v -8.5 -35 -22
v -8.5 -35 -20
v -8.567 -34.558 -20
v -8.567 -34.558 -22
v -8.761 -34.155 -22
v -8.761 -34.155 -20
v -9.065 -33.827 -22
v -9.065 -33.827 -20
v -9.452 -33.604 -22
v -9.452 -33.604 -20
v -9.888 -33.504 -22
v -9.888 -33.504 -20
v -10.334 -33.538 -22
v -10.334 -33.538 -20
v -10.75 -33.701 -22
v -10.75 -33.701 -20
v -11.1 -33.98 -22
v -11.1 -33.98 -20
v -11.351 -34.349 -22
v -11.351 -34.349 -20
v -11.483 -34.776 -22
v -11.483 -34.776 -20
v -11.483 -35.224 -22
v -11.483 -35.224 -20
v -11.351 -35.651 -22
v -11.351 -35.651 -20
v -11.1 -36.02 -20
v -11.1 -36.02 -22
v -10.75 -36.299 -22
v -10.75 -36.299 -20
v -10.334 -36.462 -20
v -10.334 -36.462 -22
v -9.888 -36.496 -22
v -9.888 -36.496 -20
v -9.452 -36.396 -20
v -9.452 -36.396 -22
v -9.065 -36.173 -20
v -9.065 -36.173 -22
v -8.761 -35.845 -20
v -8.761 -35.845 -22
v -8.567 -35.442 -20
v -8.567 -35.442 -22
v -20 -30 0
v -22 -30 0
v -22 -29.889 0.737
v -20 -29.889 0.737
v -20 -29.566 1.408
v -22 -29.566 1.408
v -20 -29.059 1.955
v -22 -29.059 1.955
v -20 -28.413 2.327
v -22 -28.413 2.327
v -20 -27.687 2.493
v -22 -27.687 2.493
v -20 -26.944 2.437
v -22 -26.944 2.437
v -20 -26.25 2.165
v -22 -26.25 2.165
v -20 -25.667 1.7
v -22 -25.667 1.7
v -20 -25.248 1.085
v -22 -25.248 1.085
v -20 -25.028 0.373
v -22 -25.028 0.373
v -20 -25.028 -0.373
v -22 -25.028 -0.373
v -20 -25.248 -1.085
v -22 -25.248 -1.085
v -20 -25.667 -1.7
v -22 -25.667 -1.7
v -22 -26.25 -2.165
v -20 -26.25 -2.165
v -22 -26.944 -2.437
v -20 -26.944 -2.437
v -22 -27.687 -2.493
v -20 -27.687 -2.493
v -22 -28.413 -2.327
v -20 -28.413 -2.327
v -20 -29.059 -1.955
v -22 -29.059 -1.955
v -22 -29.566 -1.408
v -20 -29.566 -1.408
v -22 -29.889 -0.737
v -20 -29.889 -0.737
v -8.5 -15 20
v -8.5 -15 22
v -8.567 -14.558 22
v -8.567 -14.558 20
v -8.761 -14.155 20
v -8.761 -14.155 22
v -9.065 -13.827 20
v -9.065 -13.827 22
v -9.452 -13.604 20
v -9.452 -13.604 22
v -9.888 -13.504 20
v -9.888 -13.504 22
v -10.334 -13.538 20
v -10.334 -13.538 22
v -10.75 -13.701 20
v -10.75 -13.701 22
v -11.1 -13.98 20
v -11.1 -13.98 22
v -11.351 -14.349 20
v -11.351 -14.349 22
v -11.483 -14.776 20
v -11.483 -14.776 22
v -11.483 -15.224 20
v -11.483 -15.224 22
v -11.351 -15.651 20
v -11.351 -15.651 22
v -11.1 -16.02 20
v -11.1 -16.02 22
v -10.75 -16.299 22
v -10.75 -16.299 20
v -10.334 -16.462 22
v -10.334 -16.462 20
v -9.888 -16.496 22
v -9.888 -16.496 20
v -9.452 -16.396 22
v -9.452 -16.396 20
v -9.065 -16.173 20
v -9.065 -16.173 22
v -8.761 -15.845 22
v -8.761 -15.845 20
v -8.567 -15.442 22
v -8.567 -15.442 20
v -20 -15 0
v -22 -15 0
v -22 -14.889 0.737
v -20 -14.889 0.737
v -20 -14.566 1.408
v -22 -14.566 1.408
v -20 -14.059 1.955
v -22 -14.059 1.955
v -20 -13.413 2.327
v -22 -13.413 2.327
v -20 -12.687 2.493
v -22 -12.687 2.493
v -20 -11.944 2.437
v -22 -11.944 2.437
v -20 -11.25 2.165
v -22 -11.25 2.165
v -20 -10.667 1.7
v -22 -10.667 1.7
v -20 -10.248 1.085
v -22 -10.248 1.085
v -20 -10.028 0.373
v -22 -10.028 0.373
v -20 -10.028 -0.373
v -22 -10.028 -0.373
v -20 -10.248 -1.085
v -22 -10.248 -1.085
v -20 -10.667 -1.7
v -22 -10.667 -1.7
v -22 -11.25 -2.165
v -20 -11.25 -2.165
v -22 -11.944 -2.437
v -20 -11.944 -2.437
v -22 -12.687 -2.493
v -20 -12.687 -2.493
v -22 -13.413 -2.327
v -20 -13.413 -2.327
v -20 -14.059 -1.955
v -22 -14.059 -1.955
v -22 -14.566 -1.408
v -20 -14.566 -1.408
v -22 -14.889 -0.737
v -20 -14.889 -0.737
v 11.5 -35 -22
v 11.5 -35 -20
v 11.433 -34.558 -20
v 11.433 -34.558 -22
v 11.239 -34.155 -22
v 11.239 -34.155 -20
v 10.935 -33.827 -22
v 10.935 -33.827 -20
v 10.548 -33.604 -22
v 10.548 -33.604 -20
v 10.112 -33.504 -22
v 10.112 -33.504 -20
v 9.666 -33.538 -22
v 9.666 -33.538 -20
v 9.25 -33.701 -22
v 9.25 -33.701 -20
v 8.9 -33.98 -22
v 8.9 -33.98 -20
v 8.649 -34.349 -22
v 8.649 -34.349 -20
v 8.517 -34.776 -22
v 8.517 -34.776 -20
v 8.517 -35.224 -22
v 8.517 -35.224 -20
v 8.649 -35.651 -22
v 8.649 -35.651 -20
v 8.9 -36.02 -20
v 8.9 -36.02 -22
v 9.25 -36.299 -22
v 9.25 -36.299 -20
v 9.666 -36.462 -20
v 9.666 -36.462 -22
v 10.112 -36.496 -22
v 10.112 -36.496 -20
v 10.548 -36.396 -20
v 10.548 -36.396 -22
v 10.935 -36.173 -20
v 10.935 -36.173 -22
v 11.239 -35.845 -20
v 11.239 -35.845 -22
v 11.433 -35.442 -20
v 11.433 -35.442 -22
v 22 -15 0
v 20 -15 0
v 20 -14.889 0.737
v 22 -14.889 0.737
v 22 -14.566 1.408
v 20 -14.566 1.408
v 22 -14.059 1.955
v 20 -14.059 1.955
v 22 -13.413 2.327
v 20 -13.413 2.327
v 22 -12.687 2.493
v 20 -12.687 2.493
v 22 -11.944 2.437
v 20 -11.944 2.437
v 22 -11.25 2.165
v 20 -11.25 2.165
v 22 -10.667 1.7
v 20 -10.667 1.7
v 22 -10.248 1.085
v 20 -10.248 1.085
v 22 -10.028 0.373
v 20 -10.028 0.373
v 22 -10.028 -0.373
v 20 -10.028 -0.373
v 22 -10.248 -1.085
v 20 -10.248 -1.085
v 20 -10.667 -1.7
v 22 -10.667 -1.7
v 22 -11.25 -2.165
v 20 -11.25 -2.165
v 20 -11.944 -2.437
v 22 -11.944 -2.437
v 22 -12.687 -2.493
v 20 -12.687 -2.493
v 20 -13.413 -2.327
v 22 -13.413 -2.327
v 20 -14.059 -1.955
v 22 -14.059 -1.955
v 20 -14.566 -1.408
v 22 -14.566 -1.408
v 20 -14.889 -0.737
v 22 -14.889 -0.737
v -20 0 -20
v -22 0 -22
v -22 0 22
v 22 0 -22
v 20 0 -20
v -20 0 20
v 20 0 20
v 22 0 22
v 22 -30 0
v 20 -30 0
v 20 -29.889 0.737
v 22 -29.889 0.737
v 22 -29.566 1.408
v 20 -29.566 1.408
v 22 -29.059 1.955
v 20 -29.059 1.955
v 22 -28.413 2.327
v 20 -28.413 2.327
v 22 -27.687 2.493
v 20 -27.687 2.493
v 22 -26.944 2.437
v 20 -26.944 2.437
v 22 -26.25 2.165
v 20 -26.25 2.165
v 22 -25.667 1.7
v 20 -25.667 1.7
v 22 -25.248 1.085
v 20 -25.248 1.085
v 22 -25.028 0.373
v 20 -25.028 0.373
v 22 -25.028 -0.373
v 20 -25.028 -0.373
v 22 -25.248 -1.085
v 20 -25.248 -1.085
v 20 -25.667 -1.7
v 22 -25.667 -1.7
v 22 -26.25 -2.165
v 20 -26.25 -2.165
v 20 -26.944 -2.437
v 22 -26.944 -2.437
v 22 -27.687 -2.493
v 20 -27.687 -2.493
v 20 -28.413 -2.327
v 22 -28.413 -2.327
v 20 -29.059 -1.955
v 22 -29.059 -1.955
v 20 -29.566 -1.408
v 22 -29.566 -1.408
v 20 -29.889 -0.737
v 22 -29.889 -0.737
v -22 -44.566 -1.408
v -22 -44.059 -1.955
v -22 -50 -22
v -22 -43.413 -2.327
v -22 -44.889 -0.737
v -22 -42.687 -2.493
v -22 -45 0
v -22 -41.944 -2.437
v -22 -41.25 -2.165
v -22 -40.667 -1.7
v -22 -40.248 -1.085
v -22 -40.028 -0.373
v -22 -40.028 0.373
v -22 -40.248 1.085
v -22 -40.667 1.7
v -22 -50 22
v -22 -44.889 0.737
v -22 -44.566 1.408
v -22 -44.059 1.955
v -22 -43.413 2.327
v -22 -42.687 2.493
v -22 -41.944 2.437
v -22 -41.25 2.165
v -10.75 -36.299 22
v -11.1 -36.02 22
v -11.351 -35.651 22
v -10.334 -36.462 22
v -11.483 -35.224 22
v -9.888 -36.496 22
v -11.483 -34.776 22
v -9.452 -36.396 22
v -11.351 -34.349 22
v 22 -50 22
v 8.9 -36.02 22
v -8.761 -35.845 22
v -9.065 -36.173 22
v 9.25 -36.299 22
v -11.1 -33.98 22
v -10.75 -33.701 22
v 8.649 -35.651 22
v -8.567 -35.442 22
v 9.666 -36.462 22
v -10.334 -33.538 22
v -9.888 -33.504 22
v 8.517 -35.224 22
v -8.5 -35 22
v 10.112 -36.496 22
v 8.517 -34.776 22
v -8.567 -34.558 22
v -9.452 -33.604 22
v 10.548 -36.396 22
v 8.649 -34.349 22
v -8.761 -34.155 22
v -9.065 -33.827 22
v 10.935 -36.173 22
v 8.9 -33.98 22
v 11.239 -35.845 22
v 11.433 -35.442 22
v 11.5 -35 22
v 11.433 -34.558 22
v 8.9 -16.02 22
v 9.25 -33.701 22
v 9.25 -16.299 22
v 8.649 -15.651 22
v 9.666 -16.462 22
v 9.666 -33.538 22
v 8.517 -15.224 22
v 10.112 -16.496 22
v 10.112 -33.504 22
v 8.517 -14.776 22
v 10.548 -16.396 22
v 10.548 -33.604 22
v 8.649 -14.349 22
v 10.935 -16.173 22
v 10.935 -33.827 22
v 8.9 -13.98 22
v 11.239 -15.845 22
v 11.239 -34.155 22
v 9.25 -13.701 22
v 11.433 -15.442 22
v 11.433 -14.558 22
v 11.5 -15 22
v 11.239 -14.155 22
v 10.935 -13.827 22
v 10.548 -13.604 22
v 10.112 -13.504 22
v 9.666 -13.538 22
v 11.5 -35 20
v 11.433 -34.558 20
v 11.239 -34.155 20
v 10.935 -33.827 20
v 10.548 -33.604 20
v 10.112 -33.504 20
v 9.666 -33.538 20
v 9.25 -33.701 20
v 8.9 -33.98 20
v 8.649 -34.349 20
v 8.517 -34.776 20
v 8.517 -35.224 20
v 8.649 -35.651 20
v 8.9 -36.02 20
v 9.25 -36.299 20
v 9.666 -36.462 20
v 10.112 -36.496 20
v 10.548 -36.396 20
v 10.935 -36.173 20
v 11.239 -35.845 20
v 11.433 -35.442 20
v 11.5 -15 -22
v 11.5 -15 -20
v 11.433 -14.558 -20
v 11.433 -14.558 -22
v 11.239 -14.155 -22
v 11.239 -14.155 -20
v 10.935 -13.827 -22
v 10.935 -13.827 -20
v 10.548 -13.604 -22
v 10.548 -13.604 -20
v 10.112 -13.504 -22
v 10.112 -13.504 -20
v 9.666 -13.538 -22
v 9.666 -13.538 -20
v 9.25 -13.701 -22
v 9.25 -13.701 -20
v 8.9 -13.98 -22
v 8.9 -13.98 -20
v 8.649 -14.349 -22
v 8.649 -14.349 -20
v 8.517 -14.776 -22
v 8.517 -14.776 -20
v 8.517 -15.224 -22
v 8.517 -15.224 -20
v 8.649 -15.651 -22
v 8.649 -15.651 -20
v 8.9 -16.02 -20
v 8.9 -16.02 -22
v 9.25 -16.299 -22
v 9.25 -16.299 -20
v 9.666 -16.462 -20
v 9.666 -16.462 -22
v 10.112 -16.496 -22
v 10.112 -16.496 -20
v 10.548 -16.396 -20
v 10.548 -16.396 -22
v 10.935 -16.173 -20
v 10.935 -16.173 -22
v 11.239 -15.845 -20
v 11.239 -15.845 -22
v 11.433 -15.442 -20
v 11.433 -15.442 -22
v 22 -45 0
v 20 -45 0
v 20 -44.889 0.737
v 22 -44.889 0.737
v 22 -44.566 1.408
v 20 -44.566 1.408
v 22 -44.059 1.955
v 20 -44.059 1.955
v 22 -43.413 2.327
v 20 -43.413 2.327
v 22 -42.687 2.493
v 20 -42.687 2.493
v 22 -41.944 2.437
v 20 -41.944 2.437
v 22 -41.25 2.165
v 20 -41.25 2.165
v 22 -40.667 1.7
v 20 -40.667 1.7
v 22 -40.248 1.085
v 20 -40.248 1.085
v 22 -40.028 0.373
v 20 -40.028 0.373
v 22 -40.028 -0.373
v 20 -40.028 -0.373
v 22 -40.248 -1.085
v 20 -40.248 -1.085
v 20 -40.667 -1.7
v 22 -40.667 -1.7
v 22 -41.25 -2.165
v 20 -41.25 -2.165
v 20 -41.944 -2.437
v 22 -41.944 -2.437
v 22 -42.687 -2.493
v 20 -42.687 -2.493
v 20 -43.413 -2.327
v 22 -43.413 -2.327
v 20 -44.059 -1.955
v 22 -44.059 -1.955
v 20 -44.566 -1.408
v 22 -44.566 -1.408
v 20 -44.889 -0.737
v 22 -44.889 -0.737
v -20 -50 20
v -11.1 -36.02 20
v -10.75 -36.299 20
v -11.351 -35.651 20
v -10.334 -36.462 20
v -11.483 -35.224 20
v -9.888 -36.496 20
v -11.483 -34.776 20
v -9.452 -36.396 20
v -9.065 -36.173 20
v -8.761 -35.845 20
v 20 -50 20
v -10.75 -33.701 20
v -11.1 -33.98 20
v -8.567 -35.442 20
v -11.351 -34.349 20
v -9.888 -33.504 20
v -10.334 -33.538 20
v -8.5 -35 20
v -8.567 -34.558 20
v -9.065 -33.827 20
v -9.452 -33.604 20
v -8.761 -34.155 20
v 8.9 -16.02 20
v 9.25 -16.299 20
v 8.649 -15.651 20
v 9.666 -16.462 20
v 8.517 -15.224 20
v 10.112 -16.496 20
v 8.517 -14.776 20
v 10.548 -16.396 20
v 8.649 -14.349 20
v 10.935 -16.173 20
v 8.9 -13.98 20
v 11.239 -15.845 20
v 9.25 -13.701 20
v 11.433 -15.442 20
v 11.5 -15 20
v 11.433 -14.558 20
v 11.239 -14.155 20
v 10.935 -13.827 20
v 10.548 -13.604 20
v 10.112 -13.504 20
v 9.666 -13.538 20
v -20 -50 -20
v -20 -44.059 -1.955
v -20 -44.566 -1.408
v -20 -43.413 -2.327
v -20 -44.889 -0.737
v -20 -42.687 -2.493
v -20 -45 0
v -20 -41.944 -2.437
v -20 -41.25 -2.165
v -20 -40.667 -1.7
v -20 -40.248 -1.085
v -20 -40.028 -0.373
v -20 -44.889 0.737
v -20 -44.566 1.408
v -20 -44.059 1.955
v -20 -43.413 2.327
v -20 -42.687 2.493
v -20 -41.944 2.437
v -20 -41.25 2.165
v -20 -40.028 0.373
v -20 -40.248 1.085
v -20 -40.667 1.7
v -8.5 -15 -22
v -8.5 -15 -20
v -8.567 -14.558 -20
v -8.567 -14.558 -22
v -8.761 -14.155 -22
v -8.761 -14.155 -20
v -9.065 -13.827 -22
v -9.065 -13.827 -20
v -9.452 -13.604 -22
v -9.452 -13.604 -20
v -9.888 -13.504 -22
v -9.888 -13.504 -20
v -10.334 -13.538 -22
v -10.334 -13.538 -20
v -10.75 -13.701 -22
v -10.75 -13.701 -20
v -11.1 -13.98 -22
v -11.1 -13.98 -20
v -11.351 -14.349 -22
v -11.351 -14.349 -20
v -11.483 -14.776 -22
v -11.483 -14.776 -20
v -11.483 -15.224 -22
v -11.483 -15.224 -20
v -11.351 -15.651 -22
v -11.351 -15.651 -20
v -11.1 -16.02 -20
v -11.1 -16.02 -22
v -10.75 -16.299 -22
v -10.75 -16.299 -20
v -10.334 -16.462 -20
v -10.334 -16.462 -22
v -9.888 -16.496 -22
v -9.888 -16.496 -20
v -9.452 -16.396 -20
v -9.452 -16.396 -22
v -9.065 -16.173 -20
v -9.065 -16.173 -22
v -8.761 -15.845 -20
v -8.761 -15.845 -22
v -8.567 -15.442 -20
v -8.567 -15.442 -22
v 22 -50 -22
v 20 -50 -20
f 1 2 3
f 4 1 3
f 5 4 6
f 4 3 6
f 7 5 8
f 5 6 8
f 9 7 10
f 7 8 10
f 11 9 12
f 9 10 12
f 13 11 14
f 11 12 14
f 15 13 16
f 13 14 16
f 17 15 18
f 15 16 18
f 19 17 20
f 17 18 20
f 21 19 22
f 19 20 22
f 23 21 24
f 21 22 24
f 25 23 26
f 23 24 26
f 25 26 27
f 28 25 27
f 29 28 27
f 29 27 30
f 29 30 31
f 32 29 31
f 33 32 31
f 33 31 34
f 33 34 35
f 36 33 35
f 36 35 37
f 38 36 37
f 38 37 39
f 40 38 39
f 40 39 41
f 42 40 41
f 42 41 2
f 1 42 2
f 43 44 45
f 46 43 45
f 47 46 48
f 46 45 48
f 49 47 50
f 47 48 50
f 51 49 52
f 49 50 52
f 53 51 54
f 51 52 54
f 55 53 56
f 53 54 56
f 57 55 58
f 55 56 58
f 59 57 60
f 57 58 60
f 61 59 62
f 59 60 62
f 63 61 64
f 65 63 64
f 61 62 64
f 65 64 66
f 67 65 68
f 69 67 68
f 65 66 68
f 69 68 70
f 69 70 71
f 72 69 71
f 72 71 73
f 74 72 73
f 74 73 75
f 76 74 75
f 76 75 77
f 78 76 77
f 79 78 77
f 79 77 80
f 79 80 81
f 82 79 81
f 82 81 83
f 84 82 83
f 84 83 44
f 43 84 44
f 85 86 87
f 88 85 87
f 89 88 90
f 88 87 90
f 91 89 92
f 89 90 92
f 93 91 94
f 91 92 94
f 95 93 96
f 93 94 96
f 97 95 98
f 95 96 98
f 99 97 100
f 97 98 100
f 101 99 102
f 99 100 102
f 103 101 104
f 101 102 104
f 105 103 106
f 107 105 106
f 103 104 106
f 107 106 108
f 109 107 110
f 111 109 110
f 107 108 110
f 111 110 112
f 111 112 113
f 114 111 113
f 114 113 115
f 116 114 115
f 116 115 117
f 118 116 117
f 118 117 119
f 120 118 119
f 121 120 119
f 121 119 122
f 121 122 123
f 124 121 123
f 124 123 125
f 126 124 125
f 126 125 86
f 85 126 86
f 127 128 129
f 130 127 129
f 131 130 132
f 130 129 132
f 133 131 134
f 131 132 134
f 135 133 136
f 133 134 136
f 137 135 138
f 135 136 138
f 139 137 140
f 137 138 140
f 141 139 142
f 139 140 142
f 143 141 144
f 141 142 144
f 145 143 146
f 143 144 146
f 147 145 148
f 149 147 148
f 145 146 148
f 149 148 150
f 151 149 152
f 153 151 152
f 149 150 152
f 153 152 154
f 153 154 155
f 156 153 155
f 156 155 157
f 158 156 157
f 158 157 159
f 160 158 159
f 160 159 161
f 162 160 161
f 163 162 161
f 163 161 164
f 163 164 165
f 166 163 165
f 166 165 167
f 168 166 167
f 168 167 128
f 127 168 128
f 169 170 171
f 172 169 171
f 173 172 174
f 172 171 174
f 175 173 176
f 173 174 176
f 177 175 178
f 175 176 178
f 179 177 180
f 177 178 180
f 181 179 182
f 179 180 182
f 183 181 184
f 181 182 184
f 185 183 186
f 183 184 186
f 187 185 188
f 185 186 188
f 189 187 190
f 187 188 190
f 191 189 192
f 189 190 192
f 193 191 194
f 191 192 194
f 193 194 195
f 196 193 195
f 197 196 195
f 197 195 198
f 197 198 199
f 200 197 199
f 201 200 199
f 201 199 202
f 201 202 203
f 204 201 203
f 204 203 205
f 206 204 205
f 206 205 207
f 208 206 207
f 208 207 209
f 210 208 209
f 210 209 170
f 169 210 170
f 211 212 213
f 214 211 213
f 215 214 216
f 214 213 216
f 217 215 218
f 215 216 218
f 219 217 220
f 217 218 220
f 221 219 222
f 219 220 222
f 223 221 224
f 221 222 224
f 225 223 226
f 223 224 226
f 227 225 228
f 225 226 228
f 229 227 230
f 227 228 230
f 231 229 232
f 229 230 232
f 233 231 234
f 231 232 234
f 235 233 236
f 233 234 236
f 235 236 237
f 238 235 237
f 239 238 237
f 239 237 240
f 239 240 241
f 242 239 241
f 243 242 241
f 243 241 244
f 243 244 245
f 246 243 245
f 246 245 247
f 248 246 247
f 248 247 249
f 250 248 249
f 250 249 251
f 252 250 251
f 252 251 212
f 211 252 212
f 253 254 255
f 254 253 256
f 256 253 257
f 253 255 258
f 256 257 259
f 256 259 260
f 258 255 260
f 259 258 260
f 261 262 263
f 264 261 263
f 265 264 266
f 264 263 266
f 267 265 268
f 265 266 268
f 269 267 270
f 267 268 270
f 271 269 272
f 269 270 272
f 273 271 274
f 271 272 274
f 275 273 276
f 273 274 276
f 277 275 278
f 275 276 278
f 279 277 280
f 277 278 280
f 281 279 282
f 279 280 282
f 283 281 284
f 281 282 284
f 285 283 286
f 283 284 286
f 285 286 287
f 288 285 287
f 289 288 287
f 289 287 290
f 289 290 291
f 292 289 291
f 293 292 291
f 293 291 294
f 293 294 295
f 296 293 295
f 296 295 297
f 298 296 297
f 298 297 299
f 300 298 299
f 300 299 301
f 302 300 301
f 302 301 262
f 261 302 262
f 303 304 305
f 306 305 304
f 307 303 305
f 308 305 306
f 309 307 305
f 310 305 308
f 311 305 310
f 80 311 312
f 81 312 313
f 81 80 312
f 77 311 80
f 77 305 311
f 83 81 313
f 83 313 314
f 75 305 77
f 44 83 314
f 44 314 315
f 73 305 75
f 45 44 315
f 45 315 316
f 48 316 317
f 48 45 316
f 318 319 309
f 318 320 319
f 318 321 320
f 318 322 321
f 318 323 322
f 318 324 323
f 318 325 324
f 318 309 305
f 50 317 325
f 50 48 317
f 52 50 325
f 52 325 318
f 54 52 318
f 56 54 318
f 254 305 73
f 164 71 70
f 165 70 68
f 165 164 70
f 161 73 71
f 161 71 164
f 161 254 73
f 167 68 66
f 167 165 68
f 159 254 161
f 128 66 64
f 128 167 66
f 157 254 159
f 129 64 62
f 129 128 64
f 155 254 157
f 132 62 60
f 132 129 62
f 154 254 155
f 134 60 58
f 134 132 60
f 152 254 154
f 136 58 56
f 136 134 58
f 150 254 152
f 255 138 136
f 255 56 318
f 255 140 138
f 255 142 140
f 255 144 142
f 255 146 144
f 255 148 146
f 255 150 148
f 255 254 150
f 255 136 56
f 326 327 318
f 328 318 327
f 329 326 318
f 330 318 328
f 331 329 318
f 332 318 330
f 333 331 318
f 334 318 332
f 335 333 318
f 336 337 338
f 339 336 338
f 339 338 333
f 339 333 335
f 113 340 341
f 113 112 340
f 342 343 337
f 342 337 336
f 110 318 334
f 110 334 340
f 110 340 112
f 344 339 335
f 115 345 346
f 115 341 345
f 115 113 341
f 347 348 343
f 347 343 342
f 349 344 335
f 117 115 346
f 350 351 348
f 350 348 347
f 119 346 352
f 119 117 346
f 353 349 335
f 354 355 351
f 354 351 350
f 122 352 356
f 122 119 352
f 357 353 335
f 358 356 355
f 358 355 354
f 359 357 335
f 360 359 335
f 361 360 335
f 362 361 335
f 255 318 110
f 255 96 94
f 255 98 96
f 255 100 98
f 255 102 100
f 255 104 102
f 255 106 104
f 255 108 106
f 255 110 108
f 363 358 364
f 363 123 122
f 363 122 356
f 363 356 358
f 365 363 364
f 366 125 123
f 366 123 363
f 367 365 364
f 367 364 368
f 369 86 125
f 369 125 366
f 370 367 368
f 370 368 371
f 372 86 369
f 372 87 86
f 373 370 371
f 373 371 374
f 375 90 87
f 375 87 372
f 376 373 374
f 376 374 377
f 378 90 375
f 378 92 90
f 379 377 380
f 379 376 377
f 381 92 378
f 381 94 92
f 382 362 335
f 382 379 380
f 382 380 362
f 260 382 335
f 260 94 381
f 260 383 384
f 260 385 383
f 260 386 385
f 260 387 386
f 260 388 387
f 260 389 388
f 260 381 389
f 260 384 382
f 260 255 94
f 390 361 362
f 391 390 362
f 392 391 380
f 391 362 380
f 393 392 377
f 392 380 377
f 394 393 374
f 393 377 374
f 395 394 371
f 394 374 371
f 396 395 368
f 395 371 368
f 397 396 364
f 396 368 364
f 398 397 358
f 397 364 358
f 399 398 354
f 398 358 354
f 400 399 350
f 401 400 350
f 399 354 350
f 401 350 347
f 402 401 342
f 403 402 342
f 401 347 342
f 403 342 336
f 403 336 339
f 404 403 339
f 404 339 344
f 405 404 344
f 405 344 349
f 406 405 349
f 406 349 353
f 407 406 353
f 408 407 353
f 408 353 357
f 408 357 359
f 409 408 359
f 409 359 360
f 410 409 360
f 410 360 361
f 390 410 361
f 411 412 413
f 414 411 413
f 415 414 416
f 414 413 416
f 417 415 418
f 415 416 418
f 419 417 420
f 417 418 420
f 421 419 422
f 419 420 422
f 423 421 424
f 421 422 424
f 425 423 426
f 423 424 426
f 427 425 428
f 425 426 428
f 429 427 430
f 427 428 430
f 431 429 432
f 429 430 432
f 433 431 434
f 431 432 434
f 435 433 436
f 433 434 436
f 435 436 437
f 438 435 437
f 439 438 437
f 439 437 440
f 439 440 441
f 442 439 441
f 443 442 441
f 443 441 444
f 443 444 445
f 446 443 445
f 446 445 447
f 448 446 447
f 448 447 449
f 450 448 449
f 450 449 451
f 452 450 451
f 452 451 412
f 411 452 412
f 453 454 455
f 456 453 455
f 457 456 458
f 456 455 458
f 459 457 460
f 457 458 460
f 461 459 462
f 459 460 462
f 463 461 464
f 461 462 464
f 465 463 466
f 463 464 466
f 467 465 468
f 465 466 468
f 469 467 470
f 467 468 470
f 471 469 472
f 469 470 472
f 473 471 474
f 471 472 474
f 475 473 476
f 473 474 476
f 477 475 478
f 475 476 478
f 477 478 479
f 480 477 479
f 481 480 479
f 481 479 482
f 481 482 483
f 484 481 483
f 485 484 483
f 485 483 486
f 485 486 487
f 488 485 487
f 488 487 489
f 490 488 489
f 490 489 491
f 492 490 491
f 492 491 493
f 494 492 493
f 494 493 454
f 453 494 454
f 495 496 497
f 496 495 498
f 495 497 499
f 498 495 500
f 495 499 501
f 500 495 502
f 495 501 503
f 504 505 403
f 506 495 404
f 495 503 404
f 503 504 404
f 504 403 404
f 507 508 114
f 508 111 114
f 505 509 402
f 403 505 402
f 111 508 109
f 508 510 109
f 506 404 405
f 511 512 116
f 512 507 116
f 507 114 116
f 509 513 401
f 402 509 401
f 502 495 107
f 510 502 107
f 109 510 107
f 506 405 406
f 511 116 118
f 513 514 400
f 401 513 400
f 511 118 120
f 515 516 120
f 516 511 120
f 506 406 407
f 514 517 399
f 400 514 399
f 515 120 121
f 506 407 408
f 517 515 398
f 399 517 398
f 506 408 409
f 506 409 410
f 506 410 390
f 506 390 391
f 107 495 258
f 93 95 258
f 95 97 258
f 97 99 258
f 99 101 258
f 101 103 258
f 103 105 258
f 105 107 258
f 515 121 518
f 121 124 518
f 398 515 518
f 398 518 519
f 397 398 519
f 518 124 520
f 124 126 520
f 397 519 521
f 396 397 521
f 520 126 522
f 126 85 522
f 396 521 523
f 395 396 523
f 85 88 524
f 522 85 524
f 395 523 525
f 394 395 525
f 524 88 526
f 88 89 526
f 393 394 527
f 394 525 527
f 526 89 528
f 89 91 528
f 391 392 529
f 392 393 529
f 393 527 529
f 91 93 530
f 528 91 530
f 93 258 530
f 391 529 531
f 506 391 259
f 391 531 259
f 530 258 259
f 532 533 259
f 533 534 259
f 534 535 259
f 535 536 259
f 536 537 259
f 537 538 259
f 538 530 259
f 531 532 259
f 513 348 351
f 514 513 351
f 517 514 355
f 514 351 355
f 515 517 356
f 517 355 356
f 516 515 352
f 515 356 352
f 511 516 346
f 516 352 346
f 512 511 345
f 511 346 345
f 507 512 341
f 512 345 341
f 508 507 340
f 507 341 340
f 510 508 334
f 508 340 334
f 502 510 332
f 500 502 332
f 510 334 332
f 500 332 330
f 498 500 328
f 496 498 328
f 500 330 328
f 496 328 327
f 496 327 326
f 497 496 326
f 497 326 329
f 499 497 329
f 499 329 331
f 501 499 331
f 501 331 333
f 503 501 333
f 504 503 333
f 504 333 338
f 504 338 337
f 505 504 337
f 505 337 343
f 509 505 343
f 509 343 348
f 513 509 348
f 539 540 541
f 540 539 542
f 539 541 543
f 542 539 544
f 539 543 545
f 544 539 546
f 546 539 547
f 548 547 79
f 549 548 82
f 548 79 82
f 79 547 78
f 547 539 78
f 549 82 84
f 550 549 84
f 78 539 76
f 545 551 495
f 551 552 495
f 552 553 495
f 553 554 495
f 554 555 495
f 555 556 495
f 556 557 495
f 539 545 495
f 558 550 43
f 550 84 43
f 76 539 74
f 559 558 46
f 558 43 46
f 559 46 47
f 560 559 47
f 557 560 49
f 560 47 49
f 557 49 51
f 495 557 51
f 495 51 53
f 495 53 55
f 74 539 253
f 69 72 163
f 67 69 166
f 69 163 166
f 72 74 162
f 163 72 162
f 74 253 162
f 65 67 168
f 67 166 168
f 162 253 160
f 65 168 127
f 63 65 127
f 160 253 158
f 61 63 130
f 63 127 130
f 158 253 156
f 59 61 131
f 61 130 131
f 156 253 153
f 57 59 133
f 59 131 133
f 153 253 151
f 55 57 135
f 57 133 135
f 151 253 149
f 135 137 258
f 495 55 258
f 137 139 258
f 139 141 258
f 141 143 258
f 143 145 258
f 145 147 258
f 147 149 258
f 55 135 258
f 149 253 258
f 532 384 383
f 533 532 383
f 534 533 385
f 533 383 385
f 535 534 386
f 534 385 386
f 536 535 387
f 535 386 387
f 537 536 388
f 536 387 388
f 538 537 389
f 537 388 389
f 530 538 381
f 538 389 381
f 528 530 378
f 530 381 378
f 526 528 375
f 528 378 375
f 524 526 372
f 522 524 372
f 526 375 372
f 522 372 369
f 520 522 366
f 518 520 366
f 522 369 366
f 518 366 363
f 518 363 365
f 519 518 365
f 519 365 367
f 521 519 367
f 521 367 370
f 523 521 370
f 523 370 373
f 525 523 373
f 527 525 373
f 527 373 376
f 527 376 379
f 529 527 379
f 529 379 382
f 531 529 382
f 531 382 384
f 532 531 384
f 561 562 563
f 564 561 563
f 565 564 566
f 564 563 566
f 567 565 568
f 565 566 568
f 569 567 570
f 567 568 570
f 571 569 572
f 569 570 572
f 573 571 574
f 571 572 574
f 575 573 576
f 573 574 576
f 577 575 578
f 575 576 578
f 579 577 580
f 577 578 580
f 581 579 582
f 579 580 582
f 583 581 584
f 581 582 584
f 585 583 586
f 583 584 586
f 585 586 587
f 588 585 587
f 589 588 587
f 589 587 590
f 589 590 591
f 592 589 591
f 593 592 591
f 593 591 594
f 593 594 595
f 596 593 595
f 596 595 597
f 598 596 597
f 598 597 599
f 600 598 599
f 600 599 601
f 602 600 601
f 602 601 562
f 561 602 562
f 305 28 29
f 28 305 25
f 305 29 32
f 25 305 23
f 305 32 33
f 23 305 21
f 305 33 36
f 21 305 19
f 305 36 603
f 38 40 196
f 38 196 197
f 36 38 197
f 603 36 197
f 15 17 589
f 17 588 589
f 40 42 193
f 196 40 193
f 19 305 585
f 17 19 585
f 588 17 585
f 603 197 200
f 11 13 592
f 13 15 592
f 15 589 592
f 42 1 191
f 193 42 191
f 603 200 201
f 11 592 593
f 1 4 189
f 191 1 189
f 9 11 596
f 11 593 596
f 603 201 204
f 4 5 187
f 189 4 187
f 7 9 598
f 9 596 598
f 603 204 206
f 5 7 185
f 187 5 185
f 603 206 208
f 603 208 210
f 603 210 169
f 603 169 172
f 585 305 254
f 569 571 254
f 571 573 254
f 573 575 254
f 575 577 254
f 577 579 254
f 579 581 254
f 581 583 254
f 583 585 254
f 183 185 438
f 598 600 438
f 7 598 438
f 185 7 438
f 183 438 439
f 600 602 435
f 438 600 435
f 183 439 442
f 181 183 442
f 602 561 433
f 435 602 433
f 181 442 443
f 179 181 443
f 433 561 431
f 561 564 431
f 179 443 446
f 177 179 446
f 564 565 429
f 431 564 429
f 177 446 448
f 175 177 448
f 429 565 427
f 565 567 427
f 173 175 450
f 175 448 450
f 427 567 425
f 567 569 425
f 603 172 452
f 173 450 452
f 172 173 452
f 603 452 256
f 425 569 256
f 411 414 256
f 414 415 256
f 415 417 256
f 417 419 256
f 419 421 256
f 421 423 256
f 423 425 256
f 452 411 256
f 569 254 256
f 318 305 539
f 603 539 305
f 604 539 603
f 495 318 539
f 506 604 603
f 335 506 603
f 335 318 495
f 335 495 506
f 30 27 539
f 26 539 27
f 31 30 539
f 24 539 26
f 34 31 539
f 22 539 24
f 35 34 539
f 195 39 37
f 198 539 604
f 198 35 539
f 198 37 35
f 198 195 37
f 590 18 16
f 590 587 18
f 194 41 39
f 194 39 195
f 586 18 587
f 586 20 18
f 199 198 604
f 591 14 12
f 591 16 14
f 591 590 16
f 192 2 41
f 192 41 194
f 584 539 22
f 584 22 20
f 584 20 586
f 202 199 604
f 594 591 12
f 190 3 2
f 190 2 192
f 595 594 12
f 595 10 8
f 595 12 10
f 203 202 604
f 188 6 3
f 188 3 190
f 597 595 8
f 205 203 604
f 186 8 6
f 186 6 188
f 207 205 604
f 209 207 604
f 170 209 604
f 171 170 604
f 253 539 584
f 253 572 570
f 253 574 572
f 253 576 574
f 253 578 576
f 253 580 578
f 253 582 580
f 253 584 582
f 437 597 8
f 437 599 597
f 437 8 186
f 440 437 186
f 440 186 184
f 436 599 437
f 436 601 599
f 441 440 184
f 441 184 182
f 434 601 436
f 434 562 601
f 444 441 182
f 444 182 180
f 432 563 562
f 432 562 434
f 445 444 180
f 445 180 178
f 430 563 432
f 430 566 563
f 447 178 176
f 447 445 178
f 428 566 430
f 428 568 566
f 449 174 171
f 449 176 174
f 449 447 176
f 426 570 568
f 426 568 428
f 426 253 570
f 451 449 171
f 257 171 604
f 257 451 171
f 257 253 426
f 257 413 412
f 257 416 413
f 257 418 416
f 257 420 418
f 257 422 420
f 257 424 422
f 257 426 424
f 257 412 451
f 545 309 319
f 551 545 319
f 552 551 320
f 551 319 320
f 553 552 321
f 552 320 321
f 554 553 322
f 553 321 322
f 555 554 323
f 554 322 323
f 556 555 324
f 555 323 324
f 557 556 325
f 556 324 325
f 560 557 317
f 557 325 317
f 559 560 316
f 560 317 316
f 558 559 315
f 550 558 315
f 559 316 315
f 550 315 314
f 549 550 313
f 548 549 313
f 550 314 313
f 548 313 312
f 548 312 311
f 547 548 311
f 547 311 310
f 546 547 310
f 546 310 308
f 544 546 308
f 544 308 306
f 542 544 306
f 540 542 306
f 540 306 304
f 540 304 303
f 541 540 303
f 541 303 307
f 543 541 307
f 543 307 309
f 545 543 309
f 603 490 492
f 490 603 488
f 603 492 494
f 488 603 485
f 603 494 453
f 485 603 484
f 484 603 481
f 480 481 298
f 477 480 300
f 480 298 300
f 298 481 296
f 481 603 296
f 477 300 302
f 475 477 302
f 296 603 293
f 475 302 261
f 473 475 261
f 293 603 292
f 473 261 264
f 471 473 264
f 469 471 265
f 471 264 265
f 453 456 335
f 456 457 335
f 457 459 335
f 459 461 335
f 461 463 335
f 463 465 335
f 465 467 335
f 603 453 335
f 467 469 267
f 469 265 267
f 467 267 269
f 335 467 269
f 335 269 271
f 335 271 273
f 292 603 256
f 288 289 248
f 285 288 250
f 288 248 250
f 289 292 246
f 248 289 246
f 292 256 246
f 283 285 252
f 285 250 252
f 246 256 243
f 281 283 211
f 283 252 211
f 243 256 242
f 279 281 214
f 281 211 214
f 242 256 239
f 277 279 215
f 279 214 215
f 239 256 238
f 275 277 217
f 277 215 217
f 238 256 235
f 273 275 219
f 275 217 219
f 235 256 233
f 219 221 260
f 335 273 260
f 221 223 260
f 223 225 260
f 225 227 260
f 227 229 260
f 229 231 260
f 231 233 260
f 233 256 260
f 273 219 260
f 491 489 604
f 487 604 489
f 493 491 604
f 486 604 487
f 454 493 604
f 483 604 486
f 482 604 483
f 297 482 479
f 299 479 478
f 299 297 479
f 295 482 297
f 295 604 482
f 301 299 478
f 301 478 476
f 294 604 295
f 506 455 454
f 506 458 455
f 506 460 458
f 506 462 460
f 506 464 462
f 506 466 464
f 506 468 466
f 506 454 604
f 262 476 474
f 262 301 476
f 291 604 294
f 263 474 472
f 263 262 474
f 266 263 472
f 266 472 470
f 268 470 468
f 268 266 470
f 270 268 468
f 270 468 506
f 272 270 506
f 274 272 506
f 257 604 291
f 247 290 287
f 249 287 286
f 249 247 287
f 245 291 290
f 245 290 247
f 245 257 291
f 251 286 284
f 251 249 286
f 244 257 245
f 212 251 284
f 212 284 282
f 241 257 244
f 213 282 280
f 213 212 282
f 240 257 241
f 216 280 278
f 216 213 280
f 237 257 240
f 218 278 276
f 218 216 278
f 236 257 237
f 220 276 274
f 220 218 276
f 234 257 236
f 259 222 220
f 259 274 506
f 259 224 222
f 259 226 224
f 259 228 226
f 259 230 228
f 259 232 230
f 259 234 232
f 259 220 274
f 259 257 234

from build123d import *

# Parameters (mm, degrees)
F0_W     = 44
F0_H     = 44
F0_W_2   = 40
F0_H_2   = 40
F1_DEPTH = 50
F2_R     = 1.5
F3_DEPTH = 44.001
F4_R     = 2.5
F5_DEPTH = 44.001


with BuildPart() as f1:
    # F0 (on Front) → F1 (new body)
    with BuildSketch(Plane.XZ):
        Rectangle(F0_W, F0_H)
        Rectangle(F0_W_2, F0_H_2, mode=Mode.SUBTRACT)
    extrude(amount=F1_DEPTH)

    # F2 (on face) → F3 (cut, through all)
    with BuildSketch(Plane.XY.offset(22)):
        with Locations((10, -15)):
            Circle(F2_R)
        with Locations((10, -35)):
            Circle(F2_R)
        with Locations((-10, -35)):
            Circle(F2_R)
        with Locations((-10, -15)):
            Circle(F2_R)
    extrude(amount=-F3_DEPTH, mode=Mode.SUBTRACT)

    # F4 (on face) → F5 (cut, through all)
    with BuildSketch(Plane(origin=(-22, 0, 0), x_dir=(0, -1, 0), z_dir=(-1, 0, 0))):
        with Locations((12.5, 0)):
            Circle(F4_R)
        with Locations((27.5, 0)):
            Circle(F4_R)
        with Locations((42.5, 0)):
            Circle(F4_R)
    extrude(amount=-F5_DEPTH, mode=Mode.SUBTRACT)


solid = f1.part
